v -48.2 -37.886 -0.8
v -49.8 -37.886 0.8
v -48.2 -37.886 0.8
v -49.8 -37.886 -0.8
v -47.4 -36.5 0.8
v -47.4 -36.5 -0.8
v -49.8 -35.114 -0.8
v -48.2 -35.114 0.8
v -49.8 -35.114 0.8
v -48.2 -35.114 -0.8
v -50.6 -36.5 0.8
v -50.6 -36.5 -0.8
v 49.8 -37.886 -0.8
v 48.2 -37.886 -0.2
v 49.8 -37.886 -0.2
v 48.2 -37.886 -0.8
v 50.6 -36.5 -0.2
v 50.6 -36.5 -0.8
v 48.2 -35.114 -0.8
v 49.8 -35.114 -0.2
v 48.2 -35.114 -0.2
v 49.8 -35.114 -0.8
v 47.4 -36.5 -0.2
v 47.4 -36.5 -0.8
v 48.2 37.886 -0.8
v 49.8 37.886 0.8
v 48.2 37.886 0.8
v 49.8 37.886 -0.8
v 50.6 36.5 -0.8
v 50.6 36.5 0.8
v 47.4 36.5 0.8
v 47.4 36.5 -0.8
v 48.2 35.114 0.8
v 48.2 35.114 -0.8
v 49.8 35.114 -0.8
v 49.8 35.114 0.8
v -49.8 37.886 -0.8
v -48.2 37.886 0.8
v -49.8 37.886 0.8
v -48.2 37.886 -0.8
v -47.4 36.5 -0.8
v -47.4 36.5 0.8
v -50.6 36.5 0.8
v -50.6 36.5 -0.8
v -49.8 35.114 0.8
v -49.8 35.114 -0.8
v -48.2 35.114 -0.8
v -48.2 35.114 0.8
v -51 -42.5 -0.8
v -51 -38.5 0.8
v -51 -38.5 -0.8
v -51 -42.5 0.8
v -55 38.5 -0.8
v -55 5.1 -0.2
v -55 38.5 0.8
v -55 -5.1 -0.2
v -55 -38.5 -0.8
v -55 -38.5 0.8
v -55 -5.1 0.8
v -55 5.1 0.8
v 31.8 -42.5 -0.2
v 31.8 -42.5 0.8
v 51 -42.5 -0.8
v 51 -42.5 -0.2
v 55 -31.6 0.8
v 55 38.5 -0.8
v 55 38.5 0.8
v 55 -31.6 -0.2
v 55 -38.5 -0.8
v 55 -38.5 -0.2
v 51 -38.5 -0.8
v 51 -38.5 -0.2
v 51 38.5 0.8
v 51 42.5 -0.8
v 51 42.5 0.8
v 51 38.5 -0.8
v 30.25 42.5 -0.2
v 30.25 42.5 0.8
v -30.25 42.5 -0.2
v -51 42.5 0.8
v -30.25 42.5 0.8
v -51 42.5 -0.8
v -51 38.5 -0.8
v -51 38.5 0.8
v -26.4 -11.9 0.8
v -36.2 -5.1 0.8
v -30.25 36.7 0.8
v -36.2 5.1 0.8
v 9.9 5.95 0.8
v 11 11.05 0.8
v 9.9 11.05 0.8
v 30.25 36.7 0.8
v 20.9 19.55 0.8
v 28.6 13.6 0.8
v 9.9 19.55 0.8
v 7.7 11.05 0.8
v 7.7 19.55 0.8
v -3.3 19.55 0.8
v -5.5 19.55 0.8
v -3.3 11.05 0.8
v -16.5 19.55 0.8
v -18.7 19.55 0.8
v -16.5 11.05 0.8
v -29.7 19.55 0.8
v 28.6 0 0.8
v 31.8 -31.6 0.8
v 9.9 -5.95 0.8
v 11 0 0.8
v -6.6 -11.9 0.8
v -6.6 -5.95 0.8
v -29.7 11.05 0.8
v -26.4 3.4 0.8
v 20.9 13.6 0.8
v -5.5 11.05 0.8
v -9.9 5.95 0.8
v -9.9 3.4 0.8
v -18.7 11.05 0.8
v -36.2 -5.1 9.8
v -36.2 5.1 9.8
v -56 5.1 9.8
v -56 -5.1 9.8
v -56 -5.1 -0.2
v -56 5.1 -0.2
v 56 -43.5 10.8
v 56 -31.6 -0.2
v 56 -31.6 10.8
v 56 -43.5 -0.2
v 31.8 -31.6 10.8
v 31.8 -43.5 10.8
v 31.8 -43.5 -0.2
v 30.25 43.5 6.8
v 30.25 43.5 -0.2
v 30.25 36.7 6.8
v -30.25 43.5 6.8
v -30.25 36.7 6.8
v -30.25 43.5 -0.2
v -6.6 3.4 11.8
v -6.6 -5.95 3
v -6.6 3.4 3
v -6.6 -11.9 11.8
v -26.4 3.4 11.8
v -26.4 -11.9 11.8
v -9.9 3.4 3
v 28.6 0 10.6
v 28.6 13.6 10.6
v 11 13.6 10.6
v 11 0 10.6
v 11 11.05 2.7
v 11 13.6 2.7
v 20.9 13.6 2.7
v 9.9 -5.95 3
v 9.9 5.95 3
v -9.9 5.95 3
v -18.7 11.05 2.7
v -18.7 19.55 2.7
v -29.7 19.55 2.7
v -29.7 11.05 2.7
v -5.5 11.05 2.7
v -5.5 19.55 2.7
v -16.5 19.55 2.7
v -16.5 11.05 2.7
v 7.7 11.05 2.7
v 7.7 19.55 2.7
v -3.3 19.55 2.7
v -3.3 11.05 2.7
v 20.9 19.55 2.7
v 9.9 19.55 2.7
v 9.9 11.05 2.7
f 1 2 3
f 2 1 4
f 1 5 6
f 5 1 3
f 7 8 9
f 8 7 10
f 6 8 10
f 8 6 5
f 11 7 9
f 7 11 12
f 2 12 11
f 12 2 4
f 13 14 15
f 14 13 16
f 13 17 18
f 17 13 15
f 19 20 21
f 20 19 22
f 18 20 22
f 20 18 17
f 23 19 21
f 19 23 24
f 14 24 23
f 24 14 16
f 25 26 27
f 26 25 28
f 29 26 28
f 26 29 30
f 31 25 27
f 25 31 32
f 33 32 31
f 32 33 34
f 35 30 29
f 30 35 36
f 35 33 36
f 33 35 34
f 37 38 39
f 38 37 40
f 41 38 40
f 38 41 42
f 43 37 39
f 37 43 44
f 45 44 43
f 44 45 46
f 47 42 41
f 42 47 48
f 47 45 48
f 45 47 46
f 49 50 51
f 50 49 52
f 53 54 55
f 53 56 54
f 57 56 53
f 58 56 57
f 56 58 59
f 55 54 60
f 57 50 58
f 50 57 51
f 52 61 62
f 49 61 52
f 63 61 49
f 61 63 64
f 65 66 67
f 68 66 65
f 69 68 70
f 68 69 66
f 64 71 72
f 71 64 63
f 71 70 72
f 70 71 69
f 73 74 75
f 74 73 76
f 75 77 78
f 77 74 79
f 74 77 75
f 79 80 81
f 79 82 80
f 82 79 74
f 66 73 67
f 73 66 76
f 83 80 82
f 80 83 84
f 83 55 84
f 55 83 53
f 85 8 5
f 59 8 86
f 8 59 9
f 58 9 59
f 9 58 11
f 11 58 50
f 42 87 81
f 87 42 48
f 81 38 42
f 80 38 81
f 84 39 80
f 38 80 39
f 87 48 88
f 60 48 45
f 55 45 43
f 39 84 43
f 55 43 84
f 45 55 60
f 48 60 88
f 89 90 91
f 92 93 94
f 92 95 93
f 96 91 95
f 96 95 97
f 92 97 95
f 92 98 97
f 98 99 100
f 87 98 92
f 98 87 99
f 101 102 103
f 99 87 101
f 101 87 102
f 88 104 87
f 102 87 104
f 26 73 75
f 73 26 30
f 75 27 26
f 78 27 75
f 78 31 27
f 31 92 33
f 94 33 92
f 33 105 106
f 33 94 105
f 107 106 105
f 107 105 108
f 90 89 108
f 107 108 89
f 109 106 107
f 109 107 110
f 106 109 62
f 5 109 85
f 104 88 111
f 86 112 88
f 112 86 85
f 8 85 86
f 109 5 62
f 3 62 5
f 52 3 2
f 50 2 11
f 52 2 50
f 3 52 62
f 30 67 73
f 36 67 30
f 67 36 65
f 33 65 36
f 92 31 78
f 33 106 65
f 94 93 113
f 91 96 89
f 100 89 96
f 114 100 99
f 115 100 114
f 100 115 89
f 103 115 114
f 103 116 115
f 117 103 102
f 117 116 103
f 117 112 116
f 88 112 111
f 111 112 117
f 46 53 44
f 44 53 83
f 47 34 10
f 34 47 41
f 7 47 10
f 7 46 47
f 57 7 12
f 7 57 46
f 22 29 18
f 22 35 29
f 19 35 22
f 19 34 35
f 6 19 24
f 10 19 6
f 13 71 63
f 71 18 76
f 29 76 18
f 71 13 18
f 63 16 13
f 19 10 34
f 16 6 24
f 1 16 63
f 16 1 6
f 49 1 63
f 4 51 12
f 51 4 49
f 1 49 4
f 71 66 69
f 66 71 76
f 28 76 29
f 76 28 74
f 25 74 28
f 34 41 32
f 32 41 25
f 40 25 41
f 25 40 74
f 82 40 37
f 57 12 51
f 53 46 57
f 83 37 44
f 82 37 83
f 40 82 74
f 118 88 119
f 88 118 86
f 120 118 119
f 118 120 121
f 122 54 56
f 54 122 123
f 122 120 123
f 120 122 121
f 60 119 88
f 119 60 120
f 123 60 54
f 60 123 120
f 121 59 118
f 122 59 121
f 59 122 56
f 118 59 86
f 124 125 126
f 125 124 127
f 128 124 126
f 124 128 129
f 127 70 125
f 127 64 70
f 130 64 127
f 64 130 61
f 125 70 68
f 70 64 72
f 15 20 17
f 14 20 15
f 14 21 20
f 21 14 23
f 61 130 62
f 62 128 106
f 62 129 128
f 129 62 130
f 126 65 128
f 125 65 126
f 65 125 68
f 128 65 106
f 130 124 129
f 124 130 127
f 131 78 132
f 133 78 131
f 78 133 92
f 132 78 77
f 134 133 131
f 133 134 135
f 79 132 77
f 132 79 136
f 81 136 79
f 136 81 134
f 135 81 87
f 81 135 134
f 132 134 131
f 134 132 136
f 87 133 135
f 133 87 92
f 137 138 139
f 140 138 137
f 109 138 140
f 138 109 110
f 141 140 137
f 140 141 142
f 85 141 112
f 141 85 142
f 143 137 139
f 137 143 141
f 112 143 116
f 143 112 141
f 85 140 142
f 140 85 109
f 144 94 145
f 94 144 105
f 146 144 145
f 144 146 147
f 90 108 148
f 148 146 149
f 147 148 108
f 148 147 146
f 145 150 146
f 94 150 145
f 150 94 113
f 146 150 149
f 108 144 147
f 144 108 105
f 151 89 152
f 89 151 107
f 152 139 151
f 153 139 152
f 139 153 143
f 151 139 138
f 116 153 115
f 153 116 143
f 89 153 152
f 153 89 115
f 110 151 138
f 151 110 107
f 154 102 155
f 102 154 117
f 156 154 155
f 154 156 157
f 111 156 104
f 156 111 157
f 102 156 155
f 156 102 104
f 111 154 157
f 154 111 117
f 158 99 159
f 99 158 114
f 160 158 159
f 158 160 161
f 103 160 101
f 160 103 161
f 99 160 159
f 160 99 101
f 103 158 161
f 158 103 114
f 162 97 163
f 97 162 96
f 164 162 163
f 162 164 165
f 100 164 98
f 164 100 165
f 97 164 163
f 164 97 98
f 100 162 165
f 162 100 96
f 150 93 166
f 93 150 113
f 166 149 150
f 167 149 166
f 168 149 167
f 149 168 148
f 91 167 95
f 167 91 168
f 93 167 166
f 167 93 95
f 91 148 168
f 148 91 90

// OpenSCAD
// Parameters
pcb_L = 110; //[55:220:1]
pcb_W = 85; //[42.5:170:1]
pcb_T = 1.6; //[0.8:3.2:0.1]
edge_chamfer = 2; //[0.5:6:0.5]
hole_d = 3.2; //[2:6:0.1]
hole_edge_margin = 6; //[3:15:0.5]
connector_H = 10; //[5:25:1]
connector_overlap = 1; //[0.5:2:0.1]
heatsink_H = 12; //[6:30:1]
heatsink_overlap = 1; //[0.5:2:0.1]
chip_H = 3; //[1:8:0.5]
chip_overlap = 0.8; //[0.5:2:0.1]

// Mainboard PCB with holes and chamfers
module pcb_with_holes_and_chamfers() {
  difference() {
    color([0.0, 0.4, 0.2]) // PCB color
    cube([pcb_L, pcb_W, pcb_T], center=true);
    union() {
      translate([-pcb_L/2 + hole_edge_margin, -pcb_W/2 + hole_edge_margin, 0])
        cylinder(h=pcb_T*3, r=hole_d/2, center=true);
      translate([pcb_L/2 - hole_edge_margin, -pcb_W/2 + hole_edge_margin, 0])
        cylinder(h=pcb_T*3, r=hole_d/2, center=true);
      translate([pcb_L/2 - hole_edge_margin, pcb_W/2 - hole_edge_margin, 0])
        cylinder(h=pcb_T*3, r=hole_d/2, center=true);
      translate([-pcb_L/2 + hole_edge_margin, pcb_W/2 - hole_edge_margin, 0])
        cylinder(h=pcb_T*3, r=hole_d/2, center=true);
    }
    union() {
      translate([-pcb_L/2 + edge_chamfer, -pcb_W/2 + edge_chamfer, 0])
        cube([edge_chamfer*2, edge_chamfer*2, pcb_T*3], center=true);
      translate([pcb_L/2 - edge_chamfer, -pcb_W/2 + edge_chamfer, 0])
        cube([edge_chamfer*2, edge_chamfer*2, pcb_T*3], center=true);
      translate([pcb_L/2 - edge_chamfer, pcb_W/2 - edge_chamfer, 0])
        cube([edge_chamfer*2, edge_chamfer*2, pcb_T*3], center=true);
      translate([-pcb_L/2 + edge_chamfer, pcb_W/2 - edge_chamfer, 0])
        cube([edge_chamfer*2, edge_chamfer*2, pcb_T*3], center=true);
    }
  }
}

// Connectors
module connectors() {
  union() {
    color([0.85, 0.85, 0.8]) // Connector color
    translate([-pcb_L/2 + (pcb_L*0.18)/2 - connector_overlap, 0, pcb_T/2 + connector_H/2 - connector_overlap])
      cube([pcb_L*0.18, pcb_W*0.12, connector_H], center=true);
    translate([pcb_L/2 - (pcb_L*0.22)/2 + connector_overlap, -pcb_W/2 + (pcb_W*0.14)/2 - connector_overlap, pcb_T/2 + (connector_H*1.1)/2 - connector_overlap])
      cube([pcb_L*0.22, pcb_W*0.14, connector_H*1.1], center=true);
    translate([0, pcb_W/2 - (pcb_W*0.08)/2 + connector_overlap, pcb_T/2 + (connector_H*0.7)/2 - connector_overlap])
      cube([pcb_L*0.55, pcb_W*0.08, connector_H*0.7], center=true);
  }
}

// Heatsinks
module heatsinks() {
  union() {
    color([0.4, 0.4, 0.43]) // Heatsink color
    translate([-pcb_L*0.15, -pcb_W*0.05, pcb_T/2 + heatsink_H/2 - heatsink_overlap])
      cube([pcb_L*0.18, pcb_W*0.18, heatsink_H], center=true);
    translate([pcb_L*0.18, pcb_W*0.08, pcb_T/2 + (heatsink_H*0.9)/2 - heatsink_overlap])
      cube([pcb_L*0.16, pcb_W*0.16, heatsink_H*0.9], center=true);
  }
}

// Chips and components
module chips_components() {
  union() {
    color([0.2, 0.2, 0.2]) // Chip color
    translate([0, 0, pcb_T/2 + chip_H/2 - chip_overlap])
      cube([pcb_L*0.18, pcb_W*0.14, chip_H], center=true);
    translate([-pcb_L*0.22, pcb_W*0.18, pcb_T/2 + (chip_H*0.9)/2 - chip_overlap])
      cube([pcb_L*0.10, pcb_W*0.10, chip_H*0.9], center=true);
    translate([-pcb_L*0.10, pcb_W*0.18, pcb_T/2 + (chip_H*0.9)/2 - chip_overlap])
      cube([pcb_L*0.10, pcb_W*0.10, chip_H*0.9], center=true);
    translate([pcb_L*0.02, pcb_W*0.18, pcb_T/2 + (chip_H*0.9)/2 - chip_overlap])
      cube([pcb_L*0.10, pcb_W*0.10, chip_H*0.9], center=true);
    translate([pcb_L*0.14, pcb_W*0.18, pcb_T/2 + (chip_H*0.9)/2 - chip_overlap])
      cube([pcb_L*0.10, pcb_W*0.10, chip_H*0.9], center=true);
  }
}

// Complete mainboard model
module complete_mainboard_model() {
  union() {
    pcb_with_holes_and_chamfers();
    connectors();
    heatsinks();
    chips_components();
    // Silkscreen labels are not visible, so omitted
  }
}

// Render the complete model
complete_mainboard_model();
